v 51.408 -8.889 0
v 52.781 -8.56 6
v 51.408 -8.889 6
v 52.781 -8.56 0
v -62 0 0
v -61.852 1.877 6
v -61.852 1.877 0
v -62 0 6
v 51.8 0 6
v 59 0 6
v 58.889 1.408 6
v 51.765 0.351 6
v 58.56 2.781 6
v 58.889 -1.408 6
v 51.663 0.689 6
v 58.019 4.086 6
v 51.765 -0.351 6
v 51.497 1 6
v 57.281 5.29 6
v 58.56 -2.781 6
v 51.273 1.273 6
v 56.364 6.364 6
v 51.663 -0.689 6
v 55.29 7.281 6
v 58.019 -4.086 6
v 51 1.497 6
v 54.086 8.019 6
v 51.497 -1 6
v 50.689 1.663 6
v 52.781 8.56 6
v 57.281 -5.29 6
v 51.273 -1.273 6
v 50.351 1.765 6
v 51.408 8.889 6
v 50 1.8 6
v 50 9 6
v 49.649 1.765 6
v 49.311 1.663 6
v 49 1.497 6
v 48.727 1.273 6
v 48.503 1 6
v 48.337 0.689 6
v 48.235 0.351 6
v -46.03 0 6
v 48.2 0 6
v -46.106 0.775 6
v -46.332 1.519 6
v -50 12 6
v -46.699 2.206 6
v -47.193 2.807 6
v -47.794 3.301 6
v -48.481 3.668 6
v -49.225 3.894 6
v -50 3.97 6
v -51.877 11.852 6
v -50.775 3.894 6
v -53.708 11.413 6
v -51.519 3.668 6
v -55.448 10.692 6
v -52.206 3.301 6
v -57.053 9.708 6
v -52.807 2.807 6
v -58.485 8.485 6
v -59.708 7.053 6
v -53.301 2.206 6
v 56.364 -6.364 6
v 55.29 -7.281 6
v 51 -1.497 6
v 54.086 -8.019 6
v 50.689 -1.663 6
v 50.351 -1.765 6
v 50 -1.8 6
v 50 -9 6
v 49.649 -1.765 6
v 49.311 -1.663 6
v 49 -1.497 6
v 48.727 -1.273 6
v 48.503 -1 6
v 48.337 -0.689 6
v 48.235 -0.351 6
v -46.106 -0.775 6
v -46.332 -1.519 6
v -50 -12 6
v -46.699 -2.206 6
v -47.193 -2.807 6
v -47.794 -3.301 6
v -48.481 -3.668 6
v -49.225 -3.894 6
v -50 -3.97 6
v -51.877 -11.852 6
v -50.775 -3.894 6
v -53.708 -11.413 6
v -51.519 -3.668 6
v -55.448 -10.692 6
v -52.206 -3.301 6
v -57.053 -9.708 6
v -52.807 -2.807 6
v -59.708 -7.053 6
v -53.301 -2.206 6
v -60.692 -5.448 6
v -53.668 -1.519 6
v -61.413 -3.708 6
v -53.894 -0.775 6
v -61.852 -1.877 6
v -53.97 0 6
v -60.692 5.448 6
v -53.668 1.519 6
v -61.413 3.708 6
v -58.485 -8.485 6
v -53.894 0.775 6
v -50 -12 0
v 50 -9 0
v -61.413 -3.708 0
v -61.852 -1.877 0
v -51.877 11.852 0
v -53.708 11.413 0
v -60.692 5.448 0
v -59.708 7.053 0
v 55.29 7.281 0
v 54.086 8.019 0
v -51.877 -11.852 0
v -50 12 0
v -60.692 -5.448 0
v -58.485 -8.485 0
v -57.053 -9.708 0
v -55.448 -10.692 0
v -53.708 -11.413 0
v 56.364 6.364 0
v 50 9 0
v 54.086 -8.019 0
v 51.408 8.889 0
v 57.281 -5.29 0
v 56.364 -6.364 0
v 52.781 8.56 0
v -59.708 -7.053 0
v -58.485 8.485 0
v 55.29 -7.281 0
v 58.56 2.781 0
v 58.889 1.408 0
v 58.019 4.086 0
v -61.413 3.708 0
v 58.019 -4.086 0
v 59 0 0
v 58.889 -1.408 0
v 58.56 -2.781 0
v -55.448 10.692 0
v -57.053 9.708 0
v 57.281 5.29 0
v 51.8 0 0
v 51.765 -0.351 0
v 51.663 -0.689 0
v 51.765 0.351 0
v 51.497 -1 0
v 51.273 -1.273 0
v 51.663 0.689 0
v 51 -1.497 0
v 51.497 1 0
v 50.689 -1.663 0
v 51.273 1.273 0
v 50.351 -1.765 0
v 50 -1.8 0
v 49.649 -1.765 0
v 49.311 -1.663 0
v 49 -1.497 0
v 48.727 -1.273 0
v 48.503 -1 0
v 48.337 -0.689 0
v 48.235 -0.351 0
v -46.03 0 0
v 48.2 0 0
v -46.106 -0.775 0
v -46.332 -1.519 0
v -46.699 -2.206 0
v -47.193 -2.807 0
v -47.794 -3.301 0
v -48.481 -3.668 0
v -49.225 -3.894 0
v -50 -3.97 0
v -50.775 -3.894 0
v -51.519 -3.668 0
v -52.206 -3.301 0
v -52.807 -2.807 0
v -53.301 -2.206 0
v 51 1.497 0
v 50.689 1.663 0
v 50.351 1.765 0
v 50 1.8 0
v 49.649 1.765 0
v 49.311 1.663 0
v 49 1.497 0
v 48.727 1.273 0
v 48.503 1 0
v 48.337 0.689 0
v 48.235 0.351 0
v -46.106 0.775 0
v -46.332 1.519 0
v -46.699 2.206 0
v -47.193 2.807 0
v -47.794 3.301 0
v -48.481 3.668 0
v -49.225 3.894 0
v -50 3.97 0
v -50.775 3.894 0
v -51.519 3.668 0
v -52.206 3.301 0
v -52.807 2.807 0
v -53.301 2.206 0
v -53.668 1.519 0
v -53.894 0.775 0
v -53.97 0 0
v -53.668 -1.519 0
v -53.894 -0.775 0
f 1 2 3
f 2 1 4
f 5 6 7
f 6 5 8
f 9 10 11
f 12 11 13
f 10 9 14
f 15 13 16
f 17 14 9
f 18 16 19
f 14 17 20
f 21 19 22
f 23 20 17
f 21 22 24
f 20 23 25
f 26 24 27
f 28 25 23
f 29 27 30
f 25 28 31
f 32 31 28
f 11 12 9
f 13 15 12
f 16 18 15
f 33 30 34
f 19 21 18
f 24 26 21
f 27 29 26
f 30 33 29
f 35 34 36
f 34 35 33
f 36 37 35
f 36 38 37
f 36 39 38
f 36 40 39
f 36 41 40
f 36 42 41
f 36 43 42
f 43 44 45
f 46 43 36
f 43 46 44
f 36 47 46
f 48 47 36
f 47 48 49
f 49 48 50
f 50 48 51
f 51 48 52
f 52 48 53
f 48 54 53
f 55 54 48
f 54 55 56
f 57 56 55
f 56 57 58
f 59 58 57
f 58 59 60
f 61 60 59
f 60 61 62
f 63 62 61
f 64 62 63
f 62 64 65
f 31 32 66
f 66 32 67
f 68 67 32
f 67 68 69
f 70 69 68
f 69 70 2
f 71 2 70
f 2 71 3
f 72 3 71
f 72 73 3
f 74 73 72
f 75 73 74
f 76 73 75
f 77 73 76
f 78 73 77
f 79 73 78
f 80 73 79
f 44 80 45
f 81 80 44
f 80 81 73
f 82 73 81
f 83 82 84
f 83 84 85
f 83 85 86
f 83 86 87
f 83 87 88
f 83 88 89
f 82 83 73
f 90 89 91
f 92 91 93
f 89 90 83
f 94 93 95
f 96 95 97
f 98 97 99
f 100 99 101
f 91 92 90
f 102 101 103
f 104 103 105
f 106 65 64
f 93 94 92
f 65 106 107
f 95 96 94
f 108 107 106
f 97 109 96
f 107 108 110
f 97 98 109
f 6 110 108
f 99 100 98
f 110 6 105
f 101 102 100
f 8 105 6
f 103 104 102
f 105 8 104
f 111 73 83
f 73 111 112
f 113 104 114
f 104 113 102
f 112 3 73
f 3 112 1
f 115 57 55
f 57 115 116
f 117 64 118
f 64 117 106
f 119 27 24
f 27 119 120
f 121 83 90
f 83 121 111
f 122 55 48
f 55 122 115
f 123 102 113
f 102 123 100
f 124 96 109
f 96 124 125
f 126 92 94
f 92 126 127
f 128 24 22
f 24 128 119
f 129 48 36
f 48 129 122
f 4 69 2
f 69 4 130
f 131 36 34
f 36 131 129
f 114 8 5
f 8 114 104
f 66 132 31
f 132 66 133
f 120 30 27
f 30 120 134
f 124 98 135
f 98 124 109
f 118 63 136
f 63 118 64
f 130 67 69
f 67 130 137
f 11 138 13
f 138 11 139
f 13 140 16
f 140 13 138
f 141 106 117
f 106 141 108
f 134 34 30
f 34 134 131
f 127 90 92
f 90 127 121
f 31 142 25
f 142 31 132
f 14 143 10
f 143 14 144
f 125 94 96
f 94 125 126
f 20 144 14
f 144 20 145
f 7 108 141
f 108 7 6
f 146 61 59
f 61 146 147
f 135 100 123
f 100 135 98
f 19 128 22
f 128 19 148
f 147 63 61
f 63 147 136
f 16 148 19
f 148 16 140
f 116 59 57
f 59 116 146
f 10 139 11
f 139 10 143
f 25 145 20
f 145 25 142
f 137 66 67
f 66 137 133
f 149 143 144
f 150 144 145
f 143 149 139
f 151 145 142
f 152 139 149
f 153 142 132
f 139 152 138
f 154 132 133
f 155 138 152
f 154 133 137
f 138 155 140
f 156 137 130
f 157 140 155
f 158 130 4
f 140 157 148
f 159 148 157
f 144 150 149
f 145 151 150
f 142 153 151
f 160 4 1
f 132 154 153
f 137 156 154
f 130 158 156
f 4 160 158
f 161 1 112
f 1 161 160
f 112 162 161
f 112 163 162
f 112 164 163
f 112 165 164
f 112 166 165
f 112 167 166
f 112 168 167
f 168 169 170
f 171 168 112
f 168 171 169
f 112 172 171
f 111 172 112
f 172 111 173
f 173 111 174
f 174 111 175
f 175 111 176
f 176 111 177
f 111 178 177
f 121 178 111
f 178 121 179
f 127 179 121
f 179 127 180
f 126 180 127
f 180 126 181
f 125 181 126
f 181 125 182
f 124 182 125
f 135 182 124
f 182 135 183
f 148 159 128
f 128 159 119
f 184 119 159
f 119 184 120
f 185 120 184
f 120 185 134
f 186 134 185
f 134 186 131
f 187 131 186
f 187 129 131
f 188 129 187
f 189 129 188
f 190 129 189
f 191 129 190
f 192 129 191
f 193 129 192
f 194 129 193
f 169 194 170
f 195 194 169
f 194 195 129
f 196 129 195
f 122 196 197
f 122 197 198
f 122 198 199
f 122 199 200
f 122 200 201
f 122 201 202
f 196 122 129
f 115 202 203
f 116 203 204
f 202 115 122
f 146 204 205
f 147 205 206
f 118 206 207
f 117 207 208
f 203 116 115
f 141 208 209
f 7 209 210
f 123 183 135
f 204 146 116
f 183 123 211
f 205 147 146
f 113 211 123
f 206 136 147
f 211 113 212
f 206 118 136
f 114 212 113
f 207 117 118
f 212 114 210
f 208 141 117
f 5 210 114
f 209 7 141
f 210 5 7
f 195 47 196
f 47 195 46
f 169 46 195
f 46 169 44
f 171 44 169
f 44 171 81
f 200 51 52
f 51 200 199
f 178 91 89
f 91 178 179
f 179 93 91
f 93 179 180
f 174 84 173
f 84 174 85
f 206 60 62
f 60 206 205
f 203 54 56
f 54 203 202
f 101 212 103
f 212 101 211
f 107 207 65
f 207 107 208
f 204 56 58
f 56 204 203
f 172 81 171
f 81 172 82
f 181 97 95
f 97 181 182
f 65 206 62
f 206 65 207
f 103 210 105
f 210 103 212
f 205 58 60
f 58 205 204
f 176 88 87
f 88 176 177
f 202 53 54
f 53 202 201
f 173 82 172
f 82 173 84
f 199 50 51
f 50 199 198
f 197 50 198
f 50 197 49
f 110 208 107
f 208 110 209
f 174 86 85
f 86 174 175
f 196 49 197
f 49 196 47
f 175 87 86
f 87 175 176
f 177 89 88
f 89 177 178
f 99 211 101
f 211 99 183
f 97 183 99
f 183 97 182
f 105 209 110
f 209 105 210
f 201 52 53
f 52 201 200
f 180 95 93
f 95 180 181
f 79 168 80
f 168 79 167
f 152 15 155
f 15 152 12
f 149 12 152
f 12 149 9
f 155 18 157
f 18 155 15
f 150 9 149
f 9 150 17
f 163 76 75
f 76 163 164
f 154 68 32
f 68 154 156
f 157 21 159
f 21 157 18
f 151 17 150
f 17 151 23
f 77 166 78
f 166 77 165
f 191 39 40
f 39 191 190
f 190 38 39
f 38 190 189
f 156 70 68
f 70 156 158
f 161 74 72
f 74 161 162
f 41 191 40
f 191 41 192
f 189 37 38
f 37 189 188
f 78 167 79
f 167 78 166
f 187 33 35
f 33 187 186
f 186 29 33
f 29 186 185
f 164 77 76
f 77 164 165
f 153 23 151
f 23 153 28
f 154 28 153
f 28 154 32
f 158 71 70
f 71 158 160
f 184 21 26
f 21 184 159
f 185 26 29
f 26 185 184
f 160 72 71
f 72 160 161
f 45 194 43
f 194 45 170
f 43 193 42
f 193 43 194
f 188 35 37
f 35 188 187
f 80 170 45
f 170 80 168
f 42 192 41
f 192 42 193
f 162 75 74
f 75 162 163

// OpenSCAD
$fn = 32;

// ----------------------------------------------------------------------
// Lever: 100 mm between the bosses, 6 mm thick, smooth outline
// ----------------------------------------------------------------------

// --- parameters (mm) ---
lever_l = 100;            // distance between the boss centres
boss_a = 24;              // first boss diameter
boss_b = 18;              // second boss diameter
bore_a = 7.94;            // first bore
bore_b = 3.6;             // second bore
lever_t = 6;              // lever thickness

lever_profile = [[-62, 0], [-61.852, -1.877], [-61.413, -3.708], [-60.692, -5.448], [-59.708, -7.053], [-58.485, -8.485], [-57.053, -9.708], [-55.448, -10.692], [-53.708, -11.413], [-51.877, -11.852], [-50, -12], [50, -9], [51.408, -8.889], [52.781, -8.56], [54.086, -8.019], [55.29, -7.281], [56.364, -6.364], [57.281, -5.29], [58.019, -4.086], [58.56, -2.781], [58.889, -1.408], [59, 0], [58.889, 1.408], [58.56, 2.781], [58.019, 4.086], [57.281, 5.29], [56.364, 6.364], [55.29, 7.281], [54.086, 8.019], [52.781, 8.56], [51.408, 8.889], [50, 9], [-50, 12], [-51.877, 11.852], [-53.708, 11.413], [-55.448, 10.692], [-57.053, 9.708], [-58.485, 8.485], [-59.708, 7.053], [-60.692, 5.448], [-61.413, 3.708], [-61.852, 1.877]];

difference() {
  linear_extrude(height = lever_t) polygon(lever_profile);
  translate([-50, 0, -2.5]) cylinder(h = lever_t + 5, d = bore_a);
  translate([50, 0, -2.5]) cylinder(h = lever_t + 5, d = bore_b);
}
